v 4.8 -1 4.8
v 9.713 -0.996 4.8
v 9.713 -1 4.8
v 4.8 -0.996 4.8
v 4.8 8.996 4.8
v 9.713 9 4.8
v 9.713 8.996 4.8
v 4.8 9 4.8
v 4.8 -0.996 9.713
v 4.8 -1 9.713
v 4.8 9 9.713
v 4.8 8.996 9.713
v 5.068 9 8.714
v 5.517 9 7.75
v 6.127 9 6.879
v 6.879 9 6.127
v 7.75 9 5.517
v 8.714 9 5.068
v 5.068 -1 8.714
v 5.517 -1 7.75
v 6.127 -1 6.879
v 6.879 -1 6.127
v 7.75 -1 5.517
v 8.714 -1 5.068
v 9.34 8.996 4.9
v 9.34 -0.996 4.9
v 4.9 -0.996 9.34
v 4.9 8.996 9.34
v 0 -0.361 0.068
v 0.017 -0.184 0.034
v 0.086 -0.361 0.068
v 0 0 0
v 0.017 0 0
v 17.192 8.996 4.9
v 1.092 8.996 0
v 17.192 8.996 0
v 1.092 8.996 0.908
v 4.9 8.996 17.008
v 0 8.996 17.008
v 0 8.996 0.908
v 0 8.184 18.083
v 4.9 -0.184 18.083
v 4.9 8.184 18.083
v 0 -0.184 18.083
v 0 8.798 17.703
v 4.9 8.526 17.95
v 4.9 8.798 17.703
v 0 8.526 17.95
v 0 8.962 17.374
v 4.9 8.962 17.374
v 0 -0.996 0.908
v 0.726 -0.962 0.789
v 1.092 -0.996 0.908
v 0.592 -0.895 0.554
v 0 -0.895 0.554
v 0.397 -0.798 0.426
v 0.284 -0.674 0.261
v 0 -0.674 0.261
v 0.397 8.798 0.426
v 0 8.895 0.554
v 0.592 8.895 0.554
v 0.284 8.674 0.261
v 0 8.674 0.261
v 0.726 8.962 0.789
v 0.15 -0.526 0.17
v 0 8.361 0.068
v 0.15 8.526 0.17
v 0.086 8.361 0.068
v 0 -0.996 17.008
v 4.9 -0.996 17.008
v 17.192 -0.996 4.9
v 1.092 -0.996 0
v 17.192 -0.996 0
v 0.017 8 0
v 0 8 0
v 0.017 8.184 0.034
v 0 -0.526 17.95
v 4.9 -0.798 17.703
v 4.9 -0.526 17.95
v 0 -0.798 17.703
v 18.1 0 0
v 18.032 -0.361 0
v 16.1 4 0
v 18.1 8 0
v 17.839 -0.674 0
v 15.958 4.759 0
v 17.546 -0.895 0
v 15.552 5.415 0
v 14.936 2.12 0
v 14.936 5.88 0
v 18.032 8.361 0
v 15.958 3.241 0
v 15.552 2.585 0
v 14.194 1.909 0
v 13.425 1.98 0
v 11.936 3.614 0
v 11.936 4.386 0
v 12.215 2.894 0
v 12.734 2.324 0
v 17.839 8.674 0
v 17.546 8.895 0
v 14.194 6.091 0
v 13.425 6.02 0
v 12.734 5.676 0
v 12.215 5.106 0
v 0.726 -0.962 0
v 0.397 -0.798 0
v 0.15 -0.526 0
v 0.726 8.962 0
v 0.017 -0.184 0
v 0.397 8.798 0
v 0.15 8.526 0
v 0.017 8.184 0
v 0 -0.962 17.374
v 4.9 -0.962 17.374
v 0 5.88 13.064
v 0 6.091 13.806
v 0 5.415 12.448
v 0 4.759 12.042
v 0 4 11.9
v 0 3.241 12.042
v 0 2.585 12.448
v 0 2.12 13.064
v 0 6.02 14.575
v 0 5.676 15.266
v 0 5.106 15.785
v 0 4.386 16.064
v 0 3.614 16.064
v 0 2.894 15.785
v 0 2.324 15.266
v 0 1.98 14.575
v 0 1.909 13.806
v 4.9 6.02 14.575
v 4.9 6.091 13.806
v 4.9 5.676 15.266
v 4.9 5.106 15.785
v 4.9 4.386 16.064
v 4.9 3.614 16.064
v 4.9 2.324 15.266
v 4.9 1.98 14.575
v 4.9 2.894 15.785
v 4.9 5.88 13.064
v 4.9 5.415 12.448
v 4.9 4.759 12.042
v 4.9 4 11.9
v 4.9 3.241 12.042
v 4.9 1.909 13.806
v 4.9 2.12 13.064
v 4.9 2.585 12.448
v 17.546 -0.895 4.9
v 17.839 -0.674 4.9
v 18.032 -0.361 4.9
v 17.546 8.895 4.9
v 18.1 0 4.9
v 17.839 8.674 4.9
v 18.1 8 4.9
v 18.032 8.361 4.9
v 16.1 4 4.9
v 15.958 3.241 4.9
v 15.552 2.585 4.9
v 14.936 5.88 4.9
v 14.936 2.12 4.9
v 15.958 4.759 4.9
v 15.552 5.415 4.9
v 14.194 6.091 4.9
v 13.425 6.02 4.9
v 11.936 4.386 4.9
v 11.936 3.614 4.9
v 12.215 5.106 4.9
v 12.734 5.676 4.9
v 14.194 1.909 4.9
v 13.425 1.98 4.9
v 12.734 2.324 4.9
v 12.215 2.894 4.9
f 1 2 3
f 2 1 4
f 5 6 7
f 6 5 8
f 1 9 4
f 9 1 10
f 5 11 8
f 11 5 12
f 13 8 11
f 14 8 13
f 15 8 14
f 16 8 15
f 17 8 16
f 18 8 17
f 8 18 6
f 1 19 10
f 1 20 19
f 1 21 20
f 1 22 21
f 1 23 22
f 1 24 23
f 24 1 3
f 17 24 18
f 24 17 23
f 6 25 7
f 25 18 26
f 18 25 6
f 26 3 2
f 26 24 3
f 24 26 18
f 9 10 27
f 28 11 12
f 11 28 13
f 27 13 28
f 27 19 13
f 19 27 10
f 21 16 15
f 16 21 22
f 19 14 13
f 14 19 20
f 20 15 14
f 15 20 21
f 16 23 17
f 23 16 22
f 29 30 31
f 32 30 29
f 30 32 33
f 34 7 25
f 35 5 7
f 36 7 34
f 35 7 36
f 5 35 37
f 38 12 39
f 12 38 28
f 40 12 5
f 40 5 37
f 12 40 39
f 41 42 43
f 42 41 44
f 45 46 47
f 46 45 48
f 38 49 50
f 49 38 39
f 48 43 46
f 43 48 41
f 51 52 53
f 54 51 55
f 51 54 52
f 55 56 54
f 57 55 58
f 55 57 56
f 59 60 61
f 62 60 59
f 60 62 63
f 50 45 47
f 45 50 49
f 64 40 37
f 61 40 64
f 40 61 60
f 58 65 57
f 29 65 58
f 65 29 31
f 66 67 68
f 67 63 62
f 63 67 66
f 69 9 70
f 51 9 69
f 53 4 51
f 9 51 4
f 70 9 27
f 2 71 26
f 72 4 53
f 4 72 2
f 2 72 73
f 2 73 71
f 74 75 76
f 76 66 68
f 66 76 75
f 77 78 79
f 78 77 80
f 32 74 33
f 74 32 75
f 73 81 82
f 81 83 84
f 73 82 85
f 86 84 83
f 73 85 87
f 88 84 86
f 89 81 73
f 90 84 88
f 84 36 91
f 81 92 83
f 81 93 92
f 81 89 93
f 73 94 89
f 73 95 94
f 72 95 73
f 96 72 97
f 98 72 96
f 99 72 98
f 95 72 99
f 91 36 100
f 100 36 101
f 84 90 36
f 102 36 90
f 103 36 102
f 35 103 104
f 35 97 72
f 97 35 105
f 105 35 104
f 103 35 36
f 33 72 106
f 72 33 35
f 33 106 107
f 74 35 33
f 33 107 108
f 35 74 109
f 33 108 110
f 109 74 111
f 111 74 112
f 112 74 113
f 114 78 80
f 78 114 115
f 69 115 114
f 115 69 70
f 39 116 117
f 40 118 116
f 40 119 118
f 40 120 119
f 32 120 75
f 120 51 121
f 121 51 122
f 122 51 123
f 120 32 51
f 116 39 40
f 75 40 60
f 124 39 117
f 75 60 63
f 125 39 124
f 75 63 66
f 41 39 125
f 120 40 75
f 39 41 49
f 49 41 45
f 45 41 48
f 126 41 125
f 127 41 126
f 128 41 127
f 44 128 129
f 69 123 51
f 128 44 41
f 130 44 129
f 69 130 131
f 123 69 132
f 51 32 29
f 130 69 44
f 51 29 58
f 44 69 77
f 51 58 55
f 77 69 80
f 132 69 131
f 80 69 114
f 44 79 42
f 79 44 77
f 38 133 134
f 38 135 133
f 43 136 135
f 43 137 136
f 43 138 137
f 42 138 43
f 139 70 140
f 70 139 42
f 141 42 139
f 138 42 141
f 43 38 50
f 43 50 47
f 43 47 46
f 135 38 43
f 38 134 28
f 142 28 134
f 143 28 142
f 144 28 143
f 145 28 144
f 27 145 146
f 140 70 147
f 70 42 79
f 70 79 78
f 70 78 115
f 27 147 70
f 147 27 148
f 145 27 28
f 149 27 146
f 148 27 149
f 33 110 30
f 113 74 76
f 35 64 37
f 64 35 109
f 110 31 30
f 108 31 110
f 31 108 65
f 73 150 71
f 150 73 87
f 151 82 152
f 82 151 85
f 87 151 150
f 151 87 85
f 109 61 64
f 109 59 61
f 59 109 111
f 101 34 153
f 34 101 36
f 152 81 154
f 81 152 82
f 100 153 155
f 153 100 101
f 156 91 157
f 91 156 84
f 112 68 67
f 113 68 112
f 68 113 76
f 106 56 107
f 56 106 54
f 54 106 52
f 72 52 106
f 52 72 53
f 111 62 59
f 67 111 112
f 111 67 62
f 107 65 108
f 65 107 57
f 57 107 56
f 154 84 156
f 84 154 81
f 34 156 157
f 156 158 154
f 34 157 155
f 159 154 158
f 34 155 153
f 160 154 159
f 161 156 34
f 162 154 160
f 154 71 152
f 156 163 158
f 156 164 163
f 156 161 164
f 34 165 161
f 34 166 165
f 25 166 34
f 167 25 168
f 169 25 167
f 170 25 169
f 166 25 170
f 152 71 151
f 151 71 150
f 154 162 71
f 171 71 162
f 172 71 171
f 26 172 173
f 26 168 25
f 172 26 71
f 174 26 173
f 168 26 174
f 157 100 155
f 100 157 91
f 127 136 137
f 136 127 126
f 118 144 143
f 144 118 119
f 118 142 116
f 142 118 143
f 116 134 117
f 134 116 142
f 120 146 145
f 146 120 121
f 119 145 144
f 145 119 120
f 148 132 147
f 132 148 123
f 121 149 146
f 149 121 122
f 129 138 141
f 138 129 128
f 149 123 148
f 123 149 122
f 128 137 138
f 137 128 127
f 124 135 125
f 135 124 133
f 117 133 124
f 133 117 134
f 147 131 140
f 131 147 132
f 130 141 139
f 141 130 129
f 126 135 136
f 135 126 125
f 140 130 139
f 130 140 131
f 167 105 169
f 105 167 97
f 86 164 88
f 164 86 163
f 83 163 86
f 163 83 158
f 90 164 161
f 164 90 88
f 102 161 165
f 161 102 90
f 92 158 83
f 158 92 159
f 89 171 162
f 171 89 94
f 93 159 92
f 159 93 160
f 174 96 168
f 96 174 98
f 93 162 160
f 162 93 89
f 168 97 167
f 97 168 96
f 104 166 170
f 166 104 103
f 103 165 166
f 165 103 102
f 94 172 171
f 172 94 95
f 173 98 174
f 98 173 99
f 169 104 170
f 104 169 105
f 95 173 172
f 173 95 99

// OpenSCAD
holeHeight  = 14;
holeDia = 4.2;
holeRad = holeDia/2;

$fn=17;

%translate([0,0,-.1]) cube([100,100,0.2], center=true);

difference(){
	union(){
		translate([0,0,1]) minkowski(){
			rotate([0,90,0]) cylinder(r=1,h=.1);
			cube([4.8,8,holeHeight+holeRad]);
		}
		translate([1,0,4.8]) minkowski(){
			cylinder(r=1,h=.1);
			rotate([0,90,0]) cube([4.8,8,holeHeight+holeRad]);
		}

		translate([4.8,-1,4.8]) difference(){
			cube([6,10,6]);
			translate([6,0,6]) rotate([90,0,0]) cylinder(r=6.1,h=30,center=true, $fn=36);
		}
	}
	
	translate([0,4,holeHeight]) rotate([0,90,0]) cylinder(r=holeRad, h=50, center=true);
	translate([holeHeight,4,-1]) cylinder(r=holeRad, h=50, center=true);
}
